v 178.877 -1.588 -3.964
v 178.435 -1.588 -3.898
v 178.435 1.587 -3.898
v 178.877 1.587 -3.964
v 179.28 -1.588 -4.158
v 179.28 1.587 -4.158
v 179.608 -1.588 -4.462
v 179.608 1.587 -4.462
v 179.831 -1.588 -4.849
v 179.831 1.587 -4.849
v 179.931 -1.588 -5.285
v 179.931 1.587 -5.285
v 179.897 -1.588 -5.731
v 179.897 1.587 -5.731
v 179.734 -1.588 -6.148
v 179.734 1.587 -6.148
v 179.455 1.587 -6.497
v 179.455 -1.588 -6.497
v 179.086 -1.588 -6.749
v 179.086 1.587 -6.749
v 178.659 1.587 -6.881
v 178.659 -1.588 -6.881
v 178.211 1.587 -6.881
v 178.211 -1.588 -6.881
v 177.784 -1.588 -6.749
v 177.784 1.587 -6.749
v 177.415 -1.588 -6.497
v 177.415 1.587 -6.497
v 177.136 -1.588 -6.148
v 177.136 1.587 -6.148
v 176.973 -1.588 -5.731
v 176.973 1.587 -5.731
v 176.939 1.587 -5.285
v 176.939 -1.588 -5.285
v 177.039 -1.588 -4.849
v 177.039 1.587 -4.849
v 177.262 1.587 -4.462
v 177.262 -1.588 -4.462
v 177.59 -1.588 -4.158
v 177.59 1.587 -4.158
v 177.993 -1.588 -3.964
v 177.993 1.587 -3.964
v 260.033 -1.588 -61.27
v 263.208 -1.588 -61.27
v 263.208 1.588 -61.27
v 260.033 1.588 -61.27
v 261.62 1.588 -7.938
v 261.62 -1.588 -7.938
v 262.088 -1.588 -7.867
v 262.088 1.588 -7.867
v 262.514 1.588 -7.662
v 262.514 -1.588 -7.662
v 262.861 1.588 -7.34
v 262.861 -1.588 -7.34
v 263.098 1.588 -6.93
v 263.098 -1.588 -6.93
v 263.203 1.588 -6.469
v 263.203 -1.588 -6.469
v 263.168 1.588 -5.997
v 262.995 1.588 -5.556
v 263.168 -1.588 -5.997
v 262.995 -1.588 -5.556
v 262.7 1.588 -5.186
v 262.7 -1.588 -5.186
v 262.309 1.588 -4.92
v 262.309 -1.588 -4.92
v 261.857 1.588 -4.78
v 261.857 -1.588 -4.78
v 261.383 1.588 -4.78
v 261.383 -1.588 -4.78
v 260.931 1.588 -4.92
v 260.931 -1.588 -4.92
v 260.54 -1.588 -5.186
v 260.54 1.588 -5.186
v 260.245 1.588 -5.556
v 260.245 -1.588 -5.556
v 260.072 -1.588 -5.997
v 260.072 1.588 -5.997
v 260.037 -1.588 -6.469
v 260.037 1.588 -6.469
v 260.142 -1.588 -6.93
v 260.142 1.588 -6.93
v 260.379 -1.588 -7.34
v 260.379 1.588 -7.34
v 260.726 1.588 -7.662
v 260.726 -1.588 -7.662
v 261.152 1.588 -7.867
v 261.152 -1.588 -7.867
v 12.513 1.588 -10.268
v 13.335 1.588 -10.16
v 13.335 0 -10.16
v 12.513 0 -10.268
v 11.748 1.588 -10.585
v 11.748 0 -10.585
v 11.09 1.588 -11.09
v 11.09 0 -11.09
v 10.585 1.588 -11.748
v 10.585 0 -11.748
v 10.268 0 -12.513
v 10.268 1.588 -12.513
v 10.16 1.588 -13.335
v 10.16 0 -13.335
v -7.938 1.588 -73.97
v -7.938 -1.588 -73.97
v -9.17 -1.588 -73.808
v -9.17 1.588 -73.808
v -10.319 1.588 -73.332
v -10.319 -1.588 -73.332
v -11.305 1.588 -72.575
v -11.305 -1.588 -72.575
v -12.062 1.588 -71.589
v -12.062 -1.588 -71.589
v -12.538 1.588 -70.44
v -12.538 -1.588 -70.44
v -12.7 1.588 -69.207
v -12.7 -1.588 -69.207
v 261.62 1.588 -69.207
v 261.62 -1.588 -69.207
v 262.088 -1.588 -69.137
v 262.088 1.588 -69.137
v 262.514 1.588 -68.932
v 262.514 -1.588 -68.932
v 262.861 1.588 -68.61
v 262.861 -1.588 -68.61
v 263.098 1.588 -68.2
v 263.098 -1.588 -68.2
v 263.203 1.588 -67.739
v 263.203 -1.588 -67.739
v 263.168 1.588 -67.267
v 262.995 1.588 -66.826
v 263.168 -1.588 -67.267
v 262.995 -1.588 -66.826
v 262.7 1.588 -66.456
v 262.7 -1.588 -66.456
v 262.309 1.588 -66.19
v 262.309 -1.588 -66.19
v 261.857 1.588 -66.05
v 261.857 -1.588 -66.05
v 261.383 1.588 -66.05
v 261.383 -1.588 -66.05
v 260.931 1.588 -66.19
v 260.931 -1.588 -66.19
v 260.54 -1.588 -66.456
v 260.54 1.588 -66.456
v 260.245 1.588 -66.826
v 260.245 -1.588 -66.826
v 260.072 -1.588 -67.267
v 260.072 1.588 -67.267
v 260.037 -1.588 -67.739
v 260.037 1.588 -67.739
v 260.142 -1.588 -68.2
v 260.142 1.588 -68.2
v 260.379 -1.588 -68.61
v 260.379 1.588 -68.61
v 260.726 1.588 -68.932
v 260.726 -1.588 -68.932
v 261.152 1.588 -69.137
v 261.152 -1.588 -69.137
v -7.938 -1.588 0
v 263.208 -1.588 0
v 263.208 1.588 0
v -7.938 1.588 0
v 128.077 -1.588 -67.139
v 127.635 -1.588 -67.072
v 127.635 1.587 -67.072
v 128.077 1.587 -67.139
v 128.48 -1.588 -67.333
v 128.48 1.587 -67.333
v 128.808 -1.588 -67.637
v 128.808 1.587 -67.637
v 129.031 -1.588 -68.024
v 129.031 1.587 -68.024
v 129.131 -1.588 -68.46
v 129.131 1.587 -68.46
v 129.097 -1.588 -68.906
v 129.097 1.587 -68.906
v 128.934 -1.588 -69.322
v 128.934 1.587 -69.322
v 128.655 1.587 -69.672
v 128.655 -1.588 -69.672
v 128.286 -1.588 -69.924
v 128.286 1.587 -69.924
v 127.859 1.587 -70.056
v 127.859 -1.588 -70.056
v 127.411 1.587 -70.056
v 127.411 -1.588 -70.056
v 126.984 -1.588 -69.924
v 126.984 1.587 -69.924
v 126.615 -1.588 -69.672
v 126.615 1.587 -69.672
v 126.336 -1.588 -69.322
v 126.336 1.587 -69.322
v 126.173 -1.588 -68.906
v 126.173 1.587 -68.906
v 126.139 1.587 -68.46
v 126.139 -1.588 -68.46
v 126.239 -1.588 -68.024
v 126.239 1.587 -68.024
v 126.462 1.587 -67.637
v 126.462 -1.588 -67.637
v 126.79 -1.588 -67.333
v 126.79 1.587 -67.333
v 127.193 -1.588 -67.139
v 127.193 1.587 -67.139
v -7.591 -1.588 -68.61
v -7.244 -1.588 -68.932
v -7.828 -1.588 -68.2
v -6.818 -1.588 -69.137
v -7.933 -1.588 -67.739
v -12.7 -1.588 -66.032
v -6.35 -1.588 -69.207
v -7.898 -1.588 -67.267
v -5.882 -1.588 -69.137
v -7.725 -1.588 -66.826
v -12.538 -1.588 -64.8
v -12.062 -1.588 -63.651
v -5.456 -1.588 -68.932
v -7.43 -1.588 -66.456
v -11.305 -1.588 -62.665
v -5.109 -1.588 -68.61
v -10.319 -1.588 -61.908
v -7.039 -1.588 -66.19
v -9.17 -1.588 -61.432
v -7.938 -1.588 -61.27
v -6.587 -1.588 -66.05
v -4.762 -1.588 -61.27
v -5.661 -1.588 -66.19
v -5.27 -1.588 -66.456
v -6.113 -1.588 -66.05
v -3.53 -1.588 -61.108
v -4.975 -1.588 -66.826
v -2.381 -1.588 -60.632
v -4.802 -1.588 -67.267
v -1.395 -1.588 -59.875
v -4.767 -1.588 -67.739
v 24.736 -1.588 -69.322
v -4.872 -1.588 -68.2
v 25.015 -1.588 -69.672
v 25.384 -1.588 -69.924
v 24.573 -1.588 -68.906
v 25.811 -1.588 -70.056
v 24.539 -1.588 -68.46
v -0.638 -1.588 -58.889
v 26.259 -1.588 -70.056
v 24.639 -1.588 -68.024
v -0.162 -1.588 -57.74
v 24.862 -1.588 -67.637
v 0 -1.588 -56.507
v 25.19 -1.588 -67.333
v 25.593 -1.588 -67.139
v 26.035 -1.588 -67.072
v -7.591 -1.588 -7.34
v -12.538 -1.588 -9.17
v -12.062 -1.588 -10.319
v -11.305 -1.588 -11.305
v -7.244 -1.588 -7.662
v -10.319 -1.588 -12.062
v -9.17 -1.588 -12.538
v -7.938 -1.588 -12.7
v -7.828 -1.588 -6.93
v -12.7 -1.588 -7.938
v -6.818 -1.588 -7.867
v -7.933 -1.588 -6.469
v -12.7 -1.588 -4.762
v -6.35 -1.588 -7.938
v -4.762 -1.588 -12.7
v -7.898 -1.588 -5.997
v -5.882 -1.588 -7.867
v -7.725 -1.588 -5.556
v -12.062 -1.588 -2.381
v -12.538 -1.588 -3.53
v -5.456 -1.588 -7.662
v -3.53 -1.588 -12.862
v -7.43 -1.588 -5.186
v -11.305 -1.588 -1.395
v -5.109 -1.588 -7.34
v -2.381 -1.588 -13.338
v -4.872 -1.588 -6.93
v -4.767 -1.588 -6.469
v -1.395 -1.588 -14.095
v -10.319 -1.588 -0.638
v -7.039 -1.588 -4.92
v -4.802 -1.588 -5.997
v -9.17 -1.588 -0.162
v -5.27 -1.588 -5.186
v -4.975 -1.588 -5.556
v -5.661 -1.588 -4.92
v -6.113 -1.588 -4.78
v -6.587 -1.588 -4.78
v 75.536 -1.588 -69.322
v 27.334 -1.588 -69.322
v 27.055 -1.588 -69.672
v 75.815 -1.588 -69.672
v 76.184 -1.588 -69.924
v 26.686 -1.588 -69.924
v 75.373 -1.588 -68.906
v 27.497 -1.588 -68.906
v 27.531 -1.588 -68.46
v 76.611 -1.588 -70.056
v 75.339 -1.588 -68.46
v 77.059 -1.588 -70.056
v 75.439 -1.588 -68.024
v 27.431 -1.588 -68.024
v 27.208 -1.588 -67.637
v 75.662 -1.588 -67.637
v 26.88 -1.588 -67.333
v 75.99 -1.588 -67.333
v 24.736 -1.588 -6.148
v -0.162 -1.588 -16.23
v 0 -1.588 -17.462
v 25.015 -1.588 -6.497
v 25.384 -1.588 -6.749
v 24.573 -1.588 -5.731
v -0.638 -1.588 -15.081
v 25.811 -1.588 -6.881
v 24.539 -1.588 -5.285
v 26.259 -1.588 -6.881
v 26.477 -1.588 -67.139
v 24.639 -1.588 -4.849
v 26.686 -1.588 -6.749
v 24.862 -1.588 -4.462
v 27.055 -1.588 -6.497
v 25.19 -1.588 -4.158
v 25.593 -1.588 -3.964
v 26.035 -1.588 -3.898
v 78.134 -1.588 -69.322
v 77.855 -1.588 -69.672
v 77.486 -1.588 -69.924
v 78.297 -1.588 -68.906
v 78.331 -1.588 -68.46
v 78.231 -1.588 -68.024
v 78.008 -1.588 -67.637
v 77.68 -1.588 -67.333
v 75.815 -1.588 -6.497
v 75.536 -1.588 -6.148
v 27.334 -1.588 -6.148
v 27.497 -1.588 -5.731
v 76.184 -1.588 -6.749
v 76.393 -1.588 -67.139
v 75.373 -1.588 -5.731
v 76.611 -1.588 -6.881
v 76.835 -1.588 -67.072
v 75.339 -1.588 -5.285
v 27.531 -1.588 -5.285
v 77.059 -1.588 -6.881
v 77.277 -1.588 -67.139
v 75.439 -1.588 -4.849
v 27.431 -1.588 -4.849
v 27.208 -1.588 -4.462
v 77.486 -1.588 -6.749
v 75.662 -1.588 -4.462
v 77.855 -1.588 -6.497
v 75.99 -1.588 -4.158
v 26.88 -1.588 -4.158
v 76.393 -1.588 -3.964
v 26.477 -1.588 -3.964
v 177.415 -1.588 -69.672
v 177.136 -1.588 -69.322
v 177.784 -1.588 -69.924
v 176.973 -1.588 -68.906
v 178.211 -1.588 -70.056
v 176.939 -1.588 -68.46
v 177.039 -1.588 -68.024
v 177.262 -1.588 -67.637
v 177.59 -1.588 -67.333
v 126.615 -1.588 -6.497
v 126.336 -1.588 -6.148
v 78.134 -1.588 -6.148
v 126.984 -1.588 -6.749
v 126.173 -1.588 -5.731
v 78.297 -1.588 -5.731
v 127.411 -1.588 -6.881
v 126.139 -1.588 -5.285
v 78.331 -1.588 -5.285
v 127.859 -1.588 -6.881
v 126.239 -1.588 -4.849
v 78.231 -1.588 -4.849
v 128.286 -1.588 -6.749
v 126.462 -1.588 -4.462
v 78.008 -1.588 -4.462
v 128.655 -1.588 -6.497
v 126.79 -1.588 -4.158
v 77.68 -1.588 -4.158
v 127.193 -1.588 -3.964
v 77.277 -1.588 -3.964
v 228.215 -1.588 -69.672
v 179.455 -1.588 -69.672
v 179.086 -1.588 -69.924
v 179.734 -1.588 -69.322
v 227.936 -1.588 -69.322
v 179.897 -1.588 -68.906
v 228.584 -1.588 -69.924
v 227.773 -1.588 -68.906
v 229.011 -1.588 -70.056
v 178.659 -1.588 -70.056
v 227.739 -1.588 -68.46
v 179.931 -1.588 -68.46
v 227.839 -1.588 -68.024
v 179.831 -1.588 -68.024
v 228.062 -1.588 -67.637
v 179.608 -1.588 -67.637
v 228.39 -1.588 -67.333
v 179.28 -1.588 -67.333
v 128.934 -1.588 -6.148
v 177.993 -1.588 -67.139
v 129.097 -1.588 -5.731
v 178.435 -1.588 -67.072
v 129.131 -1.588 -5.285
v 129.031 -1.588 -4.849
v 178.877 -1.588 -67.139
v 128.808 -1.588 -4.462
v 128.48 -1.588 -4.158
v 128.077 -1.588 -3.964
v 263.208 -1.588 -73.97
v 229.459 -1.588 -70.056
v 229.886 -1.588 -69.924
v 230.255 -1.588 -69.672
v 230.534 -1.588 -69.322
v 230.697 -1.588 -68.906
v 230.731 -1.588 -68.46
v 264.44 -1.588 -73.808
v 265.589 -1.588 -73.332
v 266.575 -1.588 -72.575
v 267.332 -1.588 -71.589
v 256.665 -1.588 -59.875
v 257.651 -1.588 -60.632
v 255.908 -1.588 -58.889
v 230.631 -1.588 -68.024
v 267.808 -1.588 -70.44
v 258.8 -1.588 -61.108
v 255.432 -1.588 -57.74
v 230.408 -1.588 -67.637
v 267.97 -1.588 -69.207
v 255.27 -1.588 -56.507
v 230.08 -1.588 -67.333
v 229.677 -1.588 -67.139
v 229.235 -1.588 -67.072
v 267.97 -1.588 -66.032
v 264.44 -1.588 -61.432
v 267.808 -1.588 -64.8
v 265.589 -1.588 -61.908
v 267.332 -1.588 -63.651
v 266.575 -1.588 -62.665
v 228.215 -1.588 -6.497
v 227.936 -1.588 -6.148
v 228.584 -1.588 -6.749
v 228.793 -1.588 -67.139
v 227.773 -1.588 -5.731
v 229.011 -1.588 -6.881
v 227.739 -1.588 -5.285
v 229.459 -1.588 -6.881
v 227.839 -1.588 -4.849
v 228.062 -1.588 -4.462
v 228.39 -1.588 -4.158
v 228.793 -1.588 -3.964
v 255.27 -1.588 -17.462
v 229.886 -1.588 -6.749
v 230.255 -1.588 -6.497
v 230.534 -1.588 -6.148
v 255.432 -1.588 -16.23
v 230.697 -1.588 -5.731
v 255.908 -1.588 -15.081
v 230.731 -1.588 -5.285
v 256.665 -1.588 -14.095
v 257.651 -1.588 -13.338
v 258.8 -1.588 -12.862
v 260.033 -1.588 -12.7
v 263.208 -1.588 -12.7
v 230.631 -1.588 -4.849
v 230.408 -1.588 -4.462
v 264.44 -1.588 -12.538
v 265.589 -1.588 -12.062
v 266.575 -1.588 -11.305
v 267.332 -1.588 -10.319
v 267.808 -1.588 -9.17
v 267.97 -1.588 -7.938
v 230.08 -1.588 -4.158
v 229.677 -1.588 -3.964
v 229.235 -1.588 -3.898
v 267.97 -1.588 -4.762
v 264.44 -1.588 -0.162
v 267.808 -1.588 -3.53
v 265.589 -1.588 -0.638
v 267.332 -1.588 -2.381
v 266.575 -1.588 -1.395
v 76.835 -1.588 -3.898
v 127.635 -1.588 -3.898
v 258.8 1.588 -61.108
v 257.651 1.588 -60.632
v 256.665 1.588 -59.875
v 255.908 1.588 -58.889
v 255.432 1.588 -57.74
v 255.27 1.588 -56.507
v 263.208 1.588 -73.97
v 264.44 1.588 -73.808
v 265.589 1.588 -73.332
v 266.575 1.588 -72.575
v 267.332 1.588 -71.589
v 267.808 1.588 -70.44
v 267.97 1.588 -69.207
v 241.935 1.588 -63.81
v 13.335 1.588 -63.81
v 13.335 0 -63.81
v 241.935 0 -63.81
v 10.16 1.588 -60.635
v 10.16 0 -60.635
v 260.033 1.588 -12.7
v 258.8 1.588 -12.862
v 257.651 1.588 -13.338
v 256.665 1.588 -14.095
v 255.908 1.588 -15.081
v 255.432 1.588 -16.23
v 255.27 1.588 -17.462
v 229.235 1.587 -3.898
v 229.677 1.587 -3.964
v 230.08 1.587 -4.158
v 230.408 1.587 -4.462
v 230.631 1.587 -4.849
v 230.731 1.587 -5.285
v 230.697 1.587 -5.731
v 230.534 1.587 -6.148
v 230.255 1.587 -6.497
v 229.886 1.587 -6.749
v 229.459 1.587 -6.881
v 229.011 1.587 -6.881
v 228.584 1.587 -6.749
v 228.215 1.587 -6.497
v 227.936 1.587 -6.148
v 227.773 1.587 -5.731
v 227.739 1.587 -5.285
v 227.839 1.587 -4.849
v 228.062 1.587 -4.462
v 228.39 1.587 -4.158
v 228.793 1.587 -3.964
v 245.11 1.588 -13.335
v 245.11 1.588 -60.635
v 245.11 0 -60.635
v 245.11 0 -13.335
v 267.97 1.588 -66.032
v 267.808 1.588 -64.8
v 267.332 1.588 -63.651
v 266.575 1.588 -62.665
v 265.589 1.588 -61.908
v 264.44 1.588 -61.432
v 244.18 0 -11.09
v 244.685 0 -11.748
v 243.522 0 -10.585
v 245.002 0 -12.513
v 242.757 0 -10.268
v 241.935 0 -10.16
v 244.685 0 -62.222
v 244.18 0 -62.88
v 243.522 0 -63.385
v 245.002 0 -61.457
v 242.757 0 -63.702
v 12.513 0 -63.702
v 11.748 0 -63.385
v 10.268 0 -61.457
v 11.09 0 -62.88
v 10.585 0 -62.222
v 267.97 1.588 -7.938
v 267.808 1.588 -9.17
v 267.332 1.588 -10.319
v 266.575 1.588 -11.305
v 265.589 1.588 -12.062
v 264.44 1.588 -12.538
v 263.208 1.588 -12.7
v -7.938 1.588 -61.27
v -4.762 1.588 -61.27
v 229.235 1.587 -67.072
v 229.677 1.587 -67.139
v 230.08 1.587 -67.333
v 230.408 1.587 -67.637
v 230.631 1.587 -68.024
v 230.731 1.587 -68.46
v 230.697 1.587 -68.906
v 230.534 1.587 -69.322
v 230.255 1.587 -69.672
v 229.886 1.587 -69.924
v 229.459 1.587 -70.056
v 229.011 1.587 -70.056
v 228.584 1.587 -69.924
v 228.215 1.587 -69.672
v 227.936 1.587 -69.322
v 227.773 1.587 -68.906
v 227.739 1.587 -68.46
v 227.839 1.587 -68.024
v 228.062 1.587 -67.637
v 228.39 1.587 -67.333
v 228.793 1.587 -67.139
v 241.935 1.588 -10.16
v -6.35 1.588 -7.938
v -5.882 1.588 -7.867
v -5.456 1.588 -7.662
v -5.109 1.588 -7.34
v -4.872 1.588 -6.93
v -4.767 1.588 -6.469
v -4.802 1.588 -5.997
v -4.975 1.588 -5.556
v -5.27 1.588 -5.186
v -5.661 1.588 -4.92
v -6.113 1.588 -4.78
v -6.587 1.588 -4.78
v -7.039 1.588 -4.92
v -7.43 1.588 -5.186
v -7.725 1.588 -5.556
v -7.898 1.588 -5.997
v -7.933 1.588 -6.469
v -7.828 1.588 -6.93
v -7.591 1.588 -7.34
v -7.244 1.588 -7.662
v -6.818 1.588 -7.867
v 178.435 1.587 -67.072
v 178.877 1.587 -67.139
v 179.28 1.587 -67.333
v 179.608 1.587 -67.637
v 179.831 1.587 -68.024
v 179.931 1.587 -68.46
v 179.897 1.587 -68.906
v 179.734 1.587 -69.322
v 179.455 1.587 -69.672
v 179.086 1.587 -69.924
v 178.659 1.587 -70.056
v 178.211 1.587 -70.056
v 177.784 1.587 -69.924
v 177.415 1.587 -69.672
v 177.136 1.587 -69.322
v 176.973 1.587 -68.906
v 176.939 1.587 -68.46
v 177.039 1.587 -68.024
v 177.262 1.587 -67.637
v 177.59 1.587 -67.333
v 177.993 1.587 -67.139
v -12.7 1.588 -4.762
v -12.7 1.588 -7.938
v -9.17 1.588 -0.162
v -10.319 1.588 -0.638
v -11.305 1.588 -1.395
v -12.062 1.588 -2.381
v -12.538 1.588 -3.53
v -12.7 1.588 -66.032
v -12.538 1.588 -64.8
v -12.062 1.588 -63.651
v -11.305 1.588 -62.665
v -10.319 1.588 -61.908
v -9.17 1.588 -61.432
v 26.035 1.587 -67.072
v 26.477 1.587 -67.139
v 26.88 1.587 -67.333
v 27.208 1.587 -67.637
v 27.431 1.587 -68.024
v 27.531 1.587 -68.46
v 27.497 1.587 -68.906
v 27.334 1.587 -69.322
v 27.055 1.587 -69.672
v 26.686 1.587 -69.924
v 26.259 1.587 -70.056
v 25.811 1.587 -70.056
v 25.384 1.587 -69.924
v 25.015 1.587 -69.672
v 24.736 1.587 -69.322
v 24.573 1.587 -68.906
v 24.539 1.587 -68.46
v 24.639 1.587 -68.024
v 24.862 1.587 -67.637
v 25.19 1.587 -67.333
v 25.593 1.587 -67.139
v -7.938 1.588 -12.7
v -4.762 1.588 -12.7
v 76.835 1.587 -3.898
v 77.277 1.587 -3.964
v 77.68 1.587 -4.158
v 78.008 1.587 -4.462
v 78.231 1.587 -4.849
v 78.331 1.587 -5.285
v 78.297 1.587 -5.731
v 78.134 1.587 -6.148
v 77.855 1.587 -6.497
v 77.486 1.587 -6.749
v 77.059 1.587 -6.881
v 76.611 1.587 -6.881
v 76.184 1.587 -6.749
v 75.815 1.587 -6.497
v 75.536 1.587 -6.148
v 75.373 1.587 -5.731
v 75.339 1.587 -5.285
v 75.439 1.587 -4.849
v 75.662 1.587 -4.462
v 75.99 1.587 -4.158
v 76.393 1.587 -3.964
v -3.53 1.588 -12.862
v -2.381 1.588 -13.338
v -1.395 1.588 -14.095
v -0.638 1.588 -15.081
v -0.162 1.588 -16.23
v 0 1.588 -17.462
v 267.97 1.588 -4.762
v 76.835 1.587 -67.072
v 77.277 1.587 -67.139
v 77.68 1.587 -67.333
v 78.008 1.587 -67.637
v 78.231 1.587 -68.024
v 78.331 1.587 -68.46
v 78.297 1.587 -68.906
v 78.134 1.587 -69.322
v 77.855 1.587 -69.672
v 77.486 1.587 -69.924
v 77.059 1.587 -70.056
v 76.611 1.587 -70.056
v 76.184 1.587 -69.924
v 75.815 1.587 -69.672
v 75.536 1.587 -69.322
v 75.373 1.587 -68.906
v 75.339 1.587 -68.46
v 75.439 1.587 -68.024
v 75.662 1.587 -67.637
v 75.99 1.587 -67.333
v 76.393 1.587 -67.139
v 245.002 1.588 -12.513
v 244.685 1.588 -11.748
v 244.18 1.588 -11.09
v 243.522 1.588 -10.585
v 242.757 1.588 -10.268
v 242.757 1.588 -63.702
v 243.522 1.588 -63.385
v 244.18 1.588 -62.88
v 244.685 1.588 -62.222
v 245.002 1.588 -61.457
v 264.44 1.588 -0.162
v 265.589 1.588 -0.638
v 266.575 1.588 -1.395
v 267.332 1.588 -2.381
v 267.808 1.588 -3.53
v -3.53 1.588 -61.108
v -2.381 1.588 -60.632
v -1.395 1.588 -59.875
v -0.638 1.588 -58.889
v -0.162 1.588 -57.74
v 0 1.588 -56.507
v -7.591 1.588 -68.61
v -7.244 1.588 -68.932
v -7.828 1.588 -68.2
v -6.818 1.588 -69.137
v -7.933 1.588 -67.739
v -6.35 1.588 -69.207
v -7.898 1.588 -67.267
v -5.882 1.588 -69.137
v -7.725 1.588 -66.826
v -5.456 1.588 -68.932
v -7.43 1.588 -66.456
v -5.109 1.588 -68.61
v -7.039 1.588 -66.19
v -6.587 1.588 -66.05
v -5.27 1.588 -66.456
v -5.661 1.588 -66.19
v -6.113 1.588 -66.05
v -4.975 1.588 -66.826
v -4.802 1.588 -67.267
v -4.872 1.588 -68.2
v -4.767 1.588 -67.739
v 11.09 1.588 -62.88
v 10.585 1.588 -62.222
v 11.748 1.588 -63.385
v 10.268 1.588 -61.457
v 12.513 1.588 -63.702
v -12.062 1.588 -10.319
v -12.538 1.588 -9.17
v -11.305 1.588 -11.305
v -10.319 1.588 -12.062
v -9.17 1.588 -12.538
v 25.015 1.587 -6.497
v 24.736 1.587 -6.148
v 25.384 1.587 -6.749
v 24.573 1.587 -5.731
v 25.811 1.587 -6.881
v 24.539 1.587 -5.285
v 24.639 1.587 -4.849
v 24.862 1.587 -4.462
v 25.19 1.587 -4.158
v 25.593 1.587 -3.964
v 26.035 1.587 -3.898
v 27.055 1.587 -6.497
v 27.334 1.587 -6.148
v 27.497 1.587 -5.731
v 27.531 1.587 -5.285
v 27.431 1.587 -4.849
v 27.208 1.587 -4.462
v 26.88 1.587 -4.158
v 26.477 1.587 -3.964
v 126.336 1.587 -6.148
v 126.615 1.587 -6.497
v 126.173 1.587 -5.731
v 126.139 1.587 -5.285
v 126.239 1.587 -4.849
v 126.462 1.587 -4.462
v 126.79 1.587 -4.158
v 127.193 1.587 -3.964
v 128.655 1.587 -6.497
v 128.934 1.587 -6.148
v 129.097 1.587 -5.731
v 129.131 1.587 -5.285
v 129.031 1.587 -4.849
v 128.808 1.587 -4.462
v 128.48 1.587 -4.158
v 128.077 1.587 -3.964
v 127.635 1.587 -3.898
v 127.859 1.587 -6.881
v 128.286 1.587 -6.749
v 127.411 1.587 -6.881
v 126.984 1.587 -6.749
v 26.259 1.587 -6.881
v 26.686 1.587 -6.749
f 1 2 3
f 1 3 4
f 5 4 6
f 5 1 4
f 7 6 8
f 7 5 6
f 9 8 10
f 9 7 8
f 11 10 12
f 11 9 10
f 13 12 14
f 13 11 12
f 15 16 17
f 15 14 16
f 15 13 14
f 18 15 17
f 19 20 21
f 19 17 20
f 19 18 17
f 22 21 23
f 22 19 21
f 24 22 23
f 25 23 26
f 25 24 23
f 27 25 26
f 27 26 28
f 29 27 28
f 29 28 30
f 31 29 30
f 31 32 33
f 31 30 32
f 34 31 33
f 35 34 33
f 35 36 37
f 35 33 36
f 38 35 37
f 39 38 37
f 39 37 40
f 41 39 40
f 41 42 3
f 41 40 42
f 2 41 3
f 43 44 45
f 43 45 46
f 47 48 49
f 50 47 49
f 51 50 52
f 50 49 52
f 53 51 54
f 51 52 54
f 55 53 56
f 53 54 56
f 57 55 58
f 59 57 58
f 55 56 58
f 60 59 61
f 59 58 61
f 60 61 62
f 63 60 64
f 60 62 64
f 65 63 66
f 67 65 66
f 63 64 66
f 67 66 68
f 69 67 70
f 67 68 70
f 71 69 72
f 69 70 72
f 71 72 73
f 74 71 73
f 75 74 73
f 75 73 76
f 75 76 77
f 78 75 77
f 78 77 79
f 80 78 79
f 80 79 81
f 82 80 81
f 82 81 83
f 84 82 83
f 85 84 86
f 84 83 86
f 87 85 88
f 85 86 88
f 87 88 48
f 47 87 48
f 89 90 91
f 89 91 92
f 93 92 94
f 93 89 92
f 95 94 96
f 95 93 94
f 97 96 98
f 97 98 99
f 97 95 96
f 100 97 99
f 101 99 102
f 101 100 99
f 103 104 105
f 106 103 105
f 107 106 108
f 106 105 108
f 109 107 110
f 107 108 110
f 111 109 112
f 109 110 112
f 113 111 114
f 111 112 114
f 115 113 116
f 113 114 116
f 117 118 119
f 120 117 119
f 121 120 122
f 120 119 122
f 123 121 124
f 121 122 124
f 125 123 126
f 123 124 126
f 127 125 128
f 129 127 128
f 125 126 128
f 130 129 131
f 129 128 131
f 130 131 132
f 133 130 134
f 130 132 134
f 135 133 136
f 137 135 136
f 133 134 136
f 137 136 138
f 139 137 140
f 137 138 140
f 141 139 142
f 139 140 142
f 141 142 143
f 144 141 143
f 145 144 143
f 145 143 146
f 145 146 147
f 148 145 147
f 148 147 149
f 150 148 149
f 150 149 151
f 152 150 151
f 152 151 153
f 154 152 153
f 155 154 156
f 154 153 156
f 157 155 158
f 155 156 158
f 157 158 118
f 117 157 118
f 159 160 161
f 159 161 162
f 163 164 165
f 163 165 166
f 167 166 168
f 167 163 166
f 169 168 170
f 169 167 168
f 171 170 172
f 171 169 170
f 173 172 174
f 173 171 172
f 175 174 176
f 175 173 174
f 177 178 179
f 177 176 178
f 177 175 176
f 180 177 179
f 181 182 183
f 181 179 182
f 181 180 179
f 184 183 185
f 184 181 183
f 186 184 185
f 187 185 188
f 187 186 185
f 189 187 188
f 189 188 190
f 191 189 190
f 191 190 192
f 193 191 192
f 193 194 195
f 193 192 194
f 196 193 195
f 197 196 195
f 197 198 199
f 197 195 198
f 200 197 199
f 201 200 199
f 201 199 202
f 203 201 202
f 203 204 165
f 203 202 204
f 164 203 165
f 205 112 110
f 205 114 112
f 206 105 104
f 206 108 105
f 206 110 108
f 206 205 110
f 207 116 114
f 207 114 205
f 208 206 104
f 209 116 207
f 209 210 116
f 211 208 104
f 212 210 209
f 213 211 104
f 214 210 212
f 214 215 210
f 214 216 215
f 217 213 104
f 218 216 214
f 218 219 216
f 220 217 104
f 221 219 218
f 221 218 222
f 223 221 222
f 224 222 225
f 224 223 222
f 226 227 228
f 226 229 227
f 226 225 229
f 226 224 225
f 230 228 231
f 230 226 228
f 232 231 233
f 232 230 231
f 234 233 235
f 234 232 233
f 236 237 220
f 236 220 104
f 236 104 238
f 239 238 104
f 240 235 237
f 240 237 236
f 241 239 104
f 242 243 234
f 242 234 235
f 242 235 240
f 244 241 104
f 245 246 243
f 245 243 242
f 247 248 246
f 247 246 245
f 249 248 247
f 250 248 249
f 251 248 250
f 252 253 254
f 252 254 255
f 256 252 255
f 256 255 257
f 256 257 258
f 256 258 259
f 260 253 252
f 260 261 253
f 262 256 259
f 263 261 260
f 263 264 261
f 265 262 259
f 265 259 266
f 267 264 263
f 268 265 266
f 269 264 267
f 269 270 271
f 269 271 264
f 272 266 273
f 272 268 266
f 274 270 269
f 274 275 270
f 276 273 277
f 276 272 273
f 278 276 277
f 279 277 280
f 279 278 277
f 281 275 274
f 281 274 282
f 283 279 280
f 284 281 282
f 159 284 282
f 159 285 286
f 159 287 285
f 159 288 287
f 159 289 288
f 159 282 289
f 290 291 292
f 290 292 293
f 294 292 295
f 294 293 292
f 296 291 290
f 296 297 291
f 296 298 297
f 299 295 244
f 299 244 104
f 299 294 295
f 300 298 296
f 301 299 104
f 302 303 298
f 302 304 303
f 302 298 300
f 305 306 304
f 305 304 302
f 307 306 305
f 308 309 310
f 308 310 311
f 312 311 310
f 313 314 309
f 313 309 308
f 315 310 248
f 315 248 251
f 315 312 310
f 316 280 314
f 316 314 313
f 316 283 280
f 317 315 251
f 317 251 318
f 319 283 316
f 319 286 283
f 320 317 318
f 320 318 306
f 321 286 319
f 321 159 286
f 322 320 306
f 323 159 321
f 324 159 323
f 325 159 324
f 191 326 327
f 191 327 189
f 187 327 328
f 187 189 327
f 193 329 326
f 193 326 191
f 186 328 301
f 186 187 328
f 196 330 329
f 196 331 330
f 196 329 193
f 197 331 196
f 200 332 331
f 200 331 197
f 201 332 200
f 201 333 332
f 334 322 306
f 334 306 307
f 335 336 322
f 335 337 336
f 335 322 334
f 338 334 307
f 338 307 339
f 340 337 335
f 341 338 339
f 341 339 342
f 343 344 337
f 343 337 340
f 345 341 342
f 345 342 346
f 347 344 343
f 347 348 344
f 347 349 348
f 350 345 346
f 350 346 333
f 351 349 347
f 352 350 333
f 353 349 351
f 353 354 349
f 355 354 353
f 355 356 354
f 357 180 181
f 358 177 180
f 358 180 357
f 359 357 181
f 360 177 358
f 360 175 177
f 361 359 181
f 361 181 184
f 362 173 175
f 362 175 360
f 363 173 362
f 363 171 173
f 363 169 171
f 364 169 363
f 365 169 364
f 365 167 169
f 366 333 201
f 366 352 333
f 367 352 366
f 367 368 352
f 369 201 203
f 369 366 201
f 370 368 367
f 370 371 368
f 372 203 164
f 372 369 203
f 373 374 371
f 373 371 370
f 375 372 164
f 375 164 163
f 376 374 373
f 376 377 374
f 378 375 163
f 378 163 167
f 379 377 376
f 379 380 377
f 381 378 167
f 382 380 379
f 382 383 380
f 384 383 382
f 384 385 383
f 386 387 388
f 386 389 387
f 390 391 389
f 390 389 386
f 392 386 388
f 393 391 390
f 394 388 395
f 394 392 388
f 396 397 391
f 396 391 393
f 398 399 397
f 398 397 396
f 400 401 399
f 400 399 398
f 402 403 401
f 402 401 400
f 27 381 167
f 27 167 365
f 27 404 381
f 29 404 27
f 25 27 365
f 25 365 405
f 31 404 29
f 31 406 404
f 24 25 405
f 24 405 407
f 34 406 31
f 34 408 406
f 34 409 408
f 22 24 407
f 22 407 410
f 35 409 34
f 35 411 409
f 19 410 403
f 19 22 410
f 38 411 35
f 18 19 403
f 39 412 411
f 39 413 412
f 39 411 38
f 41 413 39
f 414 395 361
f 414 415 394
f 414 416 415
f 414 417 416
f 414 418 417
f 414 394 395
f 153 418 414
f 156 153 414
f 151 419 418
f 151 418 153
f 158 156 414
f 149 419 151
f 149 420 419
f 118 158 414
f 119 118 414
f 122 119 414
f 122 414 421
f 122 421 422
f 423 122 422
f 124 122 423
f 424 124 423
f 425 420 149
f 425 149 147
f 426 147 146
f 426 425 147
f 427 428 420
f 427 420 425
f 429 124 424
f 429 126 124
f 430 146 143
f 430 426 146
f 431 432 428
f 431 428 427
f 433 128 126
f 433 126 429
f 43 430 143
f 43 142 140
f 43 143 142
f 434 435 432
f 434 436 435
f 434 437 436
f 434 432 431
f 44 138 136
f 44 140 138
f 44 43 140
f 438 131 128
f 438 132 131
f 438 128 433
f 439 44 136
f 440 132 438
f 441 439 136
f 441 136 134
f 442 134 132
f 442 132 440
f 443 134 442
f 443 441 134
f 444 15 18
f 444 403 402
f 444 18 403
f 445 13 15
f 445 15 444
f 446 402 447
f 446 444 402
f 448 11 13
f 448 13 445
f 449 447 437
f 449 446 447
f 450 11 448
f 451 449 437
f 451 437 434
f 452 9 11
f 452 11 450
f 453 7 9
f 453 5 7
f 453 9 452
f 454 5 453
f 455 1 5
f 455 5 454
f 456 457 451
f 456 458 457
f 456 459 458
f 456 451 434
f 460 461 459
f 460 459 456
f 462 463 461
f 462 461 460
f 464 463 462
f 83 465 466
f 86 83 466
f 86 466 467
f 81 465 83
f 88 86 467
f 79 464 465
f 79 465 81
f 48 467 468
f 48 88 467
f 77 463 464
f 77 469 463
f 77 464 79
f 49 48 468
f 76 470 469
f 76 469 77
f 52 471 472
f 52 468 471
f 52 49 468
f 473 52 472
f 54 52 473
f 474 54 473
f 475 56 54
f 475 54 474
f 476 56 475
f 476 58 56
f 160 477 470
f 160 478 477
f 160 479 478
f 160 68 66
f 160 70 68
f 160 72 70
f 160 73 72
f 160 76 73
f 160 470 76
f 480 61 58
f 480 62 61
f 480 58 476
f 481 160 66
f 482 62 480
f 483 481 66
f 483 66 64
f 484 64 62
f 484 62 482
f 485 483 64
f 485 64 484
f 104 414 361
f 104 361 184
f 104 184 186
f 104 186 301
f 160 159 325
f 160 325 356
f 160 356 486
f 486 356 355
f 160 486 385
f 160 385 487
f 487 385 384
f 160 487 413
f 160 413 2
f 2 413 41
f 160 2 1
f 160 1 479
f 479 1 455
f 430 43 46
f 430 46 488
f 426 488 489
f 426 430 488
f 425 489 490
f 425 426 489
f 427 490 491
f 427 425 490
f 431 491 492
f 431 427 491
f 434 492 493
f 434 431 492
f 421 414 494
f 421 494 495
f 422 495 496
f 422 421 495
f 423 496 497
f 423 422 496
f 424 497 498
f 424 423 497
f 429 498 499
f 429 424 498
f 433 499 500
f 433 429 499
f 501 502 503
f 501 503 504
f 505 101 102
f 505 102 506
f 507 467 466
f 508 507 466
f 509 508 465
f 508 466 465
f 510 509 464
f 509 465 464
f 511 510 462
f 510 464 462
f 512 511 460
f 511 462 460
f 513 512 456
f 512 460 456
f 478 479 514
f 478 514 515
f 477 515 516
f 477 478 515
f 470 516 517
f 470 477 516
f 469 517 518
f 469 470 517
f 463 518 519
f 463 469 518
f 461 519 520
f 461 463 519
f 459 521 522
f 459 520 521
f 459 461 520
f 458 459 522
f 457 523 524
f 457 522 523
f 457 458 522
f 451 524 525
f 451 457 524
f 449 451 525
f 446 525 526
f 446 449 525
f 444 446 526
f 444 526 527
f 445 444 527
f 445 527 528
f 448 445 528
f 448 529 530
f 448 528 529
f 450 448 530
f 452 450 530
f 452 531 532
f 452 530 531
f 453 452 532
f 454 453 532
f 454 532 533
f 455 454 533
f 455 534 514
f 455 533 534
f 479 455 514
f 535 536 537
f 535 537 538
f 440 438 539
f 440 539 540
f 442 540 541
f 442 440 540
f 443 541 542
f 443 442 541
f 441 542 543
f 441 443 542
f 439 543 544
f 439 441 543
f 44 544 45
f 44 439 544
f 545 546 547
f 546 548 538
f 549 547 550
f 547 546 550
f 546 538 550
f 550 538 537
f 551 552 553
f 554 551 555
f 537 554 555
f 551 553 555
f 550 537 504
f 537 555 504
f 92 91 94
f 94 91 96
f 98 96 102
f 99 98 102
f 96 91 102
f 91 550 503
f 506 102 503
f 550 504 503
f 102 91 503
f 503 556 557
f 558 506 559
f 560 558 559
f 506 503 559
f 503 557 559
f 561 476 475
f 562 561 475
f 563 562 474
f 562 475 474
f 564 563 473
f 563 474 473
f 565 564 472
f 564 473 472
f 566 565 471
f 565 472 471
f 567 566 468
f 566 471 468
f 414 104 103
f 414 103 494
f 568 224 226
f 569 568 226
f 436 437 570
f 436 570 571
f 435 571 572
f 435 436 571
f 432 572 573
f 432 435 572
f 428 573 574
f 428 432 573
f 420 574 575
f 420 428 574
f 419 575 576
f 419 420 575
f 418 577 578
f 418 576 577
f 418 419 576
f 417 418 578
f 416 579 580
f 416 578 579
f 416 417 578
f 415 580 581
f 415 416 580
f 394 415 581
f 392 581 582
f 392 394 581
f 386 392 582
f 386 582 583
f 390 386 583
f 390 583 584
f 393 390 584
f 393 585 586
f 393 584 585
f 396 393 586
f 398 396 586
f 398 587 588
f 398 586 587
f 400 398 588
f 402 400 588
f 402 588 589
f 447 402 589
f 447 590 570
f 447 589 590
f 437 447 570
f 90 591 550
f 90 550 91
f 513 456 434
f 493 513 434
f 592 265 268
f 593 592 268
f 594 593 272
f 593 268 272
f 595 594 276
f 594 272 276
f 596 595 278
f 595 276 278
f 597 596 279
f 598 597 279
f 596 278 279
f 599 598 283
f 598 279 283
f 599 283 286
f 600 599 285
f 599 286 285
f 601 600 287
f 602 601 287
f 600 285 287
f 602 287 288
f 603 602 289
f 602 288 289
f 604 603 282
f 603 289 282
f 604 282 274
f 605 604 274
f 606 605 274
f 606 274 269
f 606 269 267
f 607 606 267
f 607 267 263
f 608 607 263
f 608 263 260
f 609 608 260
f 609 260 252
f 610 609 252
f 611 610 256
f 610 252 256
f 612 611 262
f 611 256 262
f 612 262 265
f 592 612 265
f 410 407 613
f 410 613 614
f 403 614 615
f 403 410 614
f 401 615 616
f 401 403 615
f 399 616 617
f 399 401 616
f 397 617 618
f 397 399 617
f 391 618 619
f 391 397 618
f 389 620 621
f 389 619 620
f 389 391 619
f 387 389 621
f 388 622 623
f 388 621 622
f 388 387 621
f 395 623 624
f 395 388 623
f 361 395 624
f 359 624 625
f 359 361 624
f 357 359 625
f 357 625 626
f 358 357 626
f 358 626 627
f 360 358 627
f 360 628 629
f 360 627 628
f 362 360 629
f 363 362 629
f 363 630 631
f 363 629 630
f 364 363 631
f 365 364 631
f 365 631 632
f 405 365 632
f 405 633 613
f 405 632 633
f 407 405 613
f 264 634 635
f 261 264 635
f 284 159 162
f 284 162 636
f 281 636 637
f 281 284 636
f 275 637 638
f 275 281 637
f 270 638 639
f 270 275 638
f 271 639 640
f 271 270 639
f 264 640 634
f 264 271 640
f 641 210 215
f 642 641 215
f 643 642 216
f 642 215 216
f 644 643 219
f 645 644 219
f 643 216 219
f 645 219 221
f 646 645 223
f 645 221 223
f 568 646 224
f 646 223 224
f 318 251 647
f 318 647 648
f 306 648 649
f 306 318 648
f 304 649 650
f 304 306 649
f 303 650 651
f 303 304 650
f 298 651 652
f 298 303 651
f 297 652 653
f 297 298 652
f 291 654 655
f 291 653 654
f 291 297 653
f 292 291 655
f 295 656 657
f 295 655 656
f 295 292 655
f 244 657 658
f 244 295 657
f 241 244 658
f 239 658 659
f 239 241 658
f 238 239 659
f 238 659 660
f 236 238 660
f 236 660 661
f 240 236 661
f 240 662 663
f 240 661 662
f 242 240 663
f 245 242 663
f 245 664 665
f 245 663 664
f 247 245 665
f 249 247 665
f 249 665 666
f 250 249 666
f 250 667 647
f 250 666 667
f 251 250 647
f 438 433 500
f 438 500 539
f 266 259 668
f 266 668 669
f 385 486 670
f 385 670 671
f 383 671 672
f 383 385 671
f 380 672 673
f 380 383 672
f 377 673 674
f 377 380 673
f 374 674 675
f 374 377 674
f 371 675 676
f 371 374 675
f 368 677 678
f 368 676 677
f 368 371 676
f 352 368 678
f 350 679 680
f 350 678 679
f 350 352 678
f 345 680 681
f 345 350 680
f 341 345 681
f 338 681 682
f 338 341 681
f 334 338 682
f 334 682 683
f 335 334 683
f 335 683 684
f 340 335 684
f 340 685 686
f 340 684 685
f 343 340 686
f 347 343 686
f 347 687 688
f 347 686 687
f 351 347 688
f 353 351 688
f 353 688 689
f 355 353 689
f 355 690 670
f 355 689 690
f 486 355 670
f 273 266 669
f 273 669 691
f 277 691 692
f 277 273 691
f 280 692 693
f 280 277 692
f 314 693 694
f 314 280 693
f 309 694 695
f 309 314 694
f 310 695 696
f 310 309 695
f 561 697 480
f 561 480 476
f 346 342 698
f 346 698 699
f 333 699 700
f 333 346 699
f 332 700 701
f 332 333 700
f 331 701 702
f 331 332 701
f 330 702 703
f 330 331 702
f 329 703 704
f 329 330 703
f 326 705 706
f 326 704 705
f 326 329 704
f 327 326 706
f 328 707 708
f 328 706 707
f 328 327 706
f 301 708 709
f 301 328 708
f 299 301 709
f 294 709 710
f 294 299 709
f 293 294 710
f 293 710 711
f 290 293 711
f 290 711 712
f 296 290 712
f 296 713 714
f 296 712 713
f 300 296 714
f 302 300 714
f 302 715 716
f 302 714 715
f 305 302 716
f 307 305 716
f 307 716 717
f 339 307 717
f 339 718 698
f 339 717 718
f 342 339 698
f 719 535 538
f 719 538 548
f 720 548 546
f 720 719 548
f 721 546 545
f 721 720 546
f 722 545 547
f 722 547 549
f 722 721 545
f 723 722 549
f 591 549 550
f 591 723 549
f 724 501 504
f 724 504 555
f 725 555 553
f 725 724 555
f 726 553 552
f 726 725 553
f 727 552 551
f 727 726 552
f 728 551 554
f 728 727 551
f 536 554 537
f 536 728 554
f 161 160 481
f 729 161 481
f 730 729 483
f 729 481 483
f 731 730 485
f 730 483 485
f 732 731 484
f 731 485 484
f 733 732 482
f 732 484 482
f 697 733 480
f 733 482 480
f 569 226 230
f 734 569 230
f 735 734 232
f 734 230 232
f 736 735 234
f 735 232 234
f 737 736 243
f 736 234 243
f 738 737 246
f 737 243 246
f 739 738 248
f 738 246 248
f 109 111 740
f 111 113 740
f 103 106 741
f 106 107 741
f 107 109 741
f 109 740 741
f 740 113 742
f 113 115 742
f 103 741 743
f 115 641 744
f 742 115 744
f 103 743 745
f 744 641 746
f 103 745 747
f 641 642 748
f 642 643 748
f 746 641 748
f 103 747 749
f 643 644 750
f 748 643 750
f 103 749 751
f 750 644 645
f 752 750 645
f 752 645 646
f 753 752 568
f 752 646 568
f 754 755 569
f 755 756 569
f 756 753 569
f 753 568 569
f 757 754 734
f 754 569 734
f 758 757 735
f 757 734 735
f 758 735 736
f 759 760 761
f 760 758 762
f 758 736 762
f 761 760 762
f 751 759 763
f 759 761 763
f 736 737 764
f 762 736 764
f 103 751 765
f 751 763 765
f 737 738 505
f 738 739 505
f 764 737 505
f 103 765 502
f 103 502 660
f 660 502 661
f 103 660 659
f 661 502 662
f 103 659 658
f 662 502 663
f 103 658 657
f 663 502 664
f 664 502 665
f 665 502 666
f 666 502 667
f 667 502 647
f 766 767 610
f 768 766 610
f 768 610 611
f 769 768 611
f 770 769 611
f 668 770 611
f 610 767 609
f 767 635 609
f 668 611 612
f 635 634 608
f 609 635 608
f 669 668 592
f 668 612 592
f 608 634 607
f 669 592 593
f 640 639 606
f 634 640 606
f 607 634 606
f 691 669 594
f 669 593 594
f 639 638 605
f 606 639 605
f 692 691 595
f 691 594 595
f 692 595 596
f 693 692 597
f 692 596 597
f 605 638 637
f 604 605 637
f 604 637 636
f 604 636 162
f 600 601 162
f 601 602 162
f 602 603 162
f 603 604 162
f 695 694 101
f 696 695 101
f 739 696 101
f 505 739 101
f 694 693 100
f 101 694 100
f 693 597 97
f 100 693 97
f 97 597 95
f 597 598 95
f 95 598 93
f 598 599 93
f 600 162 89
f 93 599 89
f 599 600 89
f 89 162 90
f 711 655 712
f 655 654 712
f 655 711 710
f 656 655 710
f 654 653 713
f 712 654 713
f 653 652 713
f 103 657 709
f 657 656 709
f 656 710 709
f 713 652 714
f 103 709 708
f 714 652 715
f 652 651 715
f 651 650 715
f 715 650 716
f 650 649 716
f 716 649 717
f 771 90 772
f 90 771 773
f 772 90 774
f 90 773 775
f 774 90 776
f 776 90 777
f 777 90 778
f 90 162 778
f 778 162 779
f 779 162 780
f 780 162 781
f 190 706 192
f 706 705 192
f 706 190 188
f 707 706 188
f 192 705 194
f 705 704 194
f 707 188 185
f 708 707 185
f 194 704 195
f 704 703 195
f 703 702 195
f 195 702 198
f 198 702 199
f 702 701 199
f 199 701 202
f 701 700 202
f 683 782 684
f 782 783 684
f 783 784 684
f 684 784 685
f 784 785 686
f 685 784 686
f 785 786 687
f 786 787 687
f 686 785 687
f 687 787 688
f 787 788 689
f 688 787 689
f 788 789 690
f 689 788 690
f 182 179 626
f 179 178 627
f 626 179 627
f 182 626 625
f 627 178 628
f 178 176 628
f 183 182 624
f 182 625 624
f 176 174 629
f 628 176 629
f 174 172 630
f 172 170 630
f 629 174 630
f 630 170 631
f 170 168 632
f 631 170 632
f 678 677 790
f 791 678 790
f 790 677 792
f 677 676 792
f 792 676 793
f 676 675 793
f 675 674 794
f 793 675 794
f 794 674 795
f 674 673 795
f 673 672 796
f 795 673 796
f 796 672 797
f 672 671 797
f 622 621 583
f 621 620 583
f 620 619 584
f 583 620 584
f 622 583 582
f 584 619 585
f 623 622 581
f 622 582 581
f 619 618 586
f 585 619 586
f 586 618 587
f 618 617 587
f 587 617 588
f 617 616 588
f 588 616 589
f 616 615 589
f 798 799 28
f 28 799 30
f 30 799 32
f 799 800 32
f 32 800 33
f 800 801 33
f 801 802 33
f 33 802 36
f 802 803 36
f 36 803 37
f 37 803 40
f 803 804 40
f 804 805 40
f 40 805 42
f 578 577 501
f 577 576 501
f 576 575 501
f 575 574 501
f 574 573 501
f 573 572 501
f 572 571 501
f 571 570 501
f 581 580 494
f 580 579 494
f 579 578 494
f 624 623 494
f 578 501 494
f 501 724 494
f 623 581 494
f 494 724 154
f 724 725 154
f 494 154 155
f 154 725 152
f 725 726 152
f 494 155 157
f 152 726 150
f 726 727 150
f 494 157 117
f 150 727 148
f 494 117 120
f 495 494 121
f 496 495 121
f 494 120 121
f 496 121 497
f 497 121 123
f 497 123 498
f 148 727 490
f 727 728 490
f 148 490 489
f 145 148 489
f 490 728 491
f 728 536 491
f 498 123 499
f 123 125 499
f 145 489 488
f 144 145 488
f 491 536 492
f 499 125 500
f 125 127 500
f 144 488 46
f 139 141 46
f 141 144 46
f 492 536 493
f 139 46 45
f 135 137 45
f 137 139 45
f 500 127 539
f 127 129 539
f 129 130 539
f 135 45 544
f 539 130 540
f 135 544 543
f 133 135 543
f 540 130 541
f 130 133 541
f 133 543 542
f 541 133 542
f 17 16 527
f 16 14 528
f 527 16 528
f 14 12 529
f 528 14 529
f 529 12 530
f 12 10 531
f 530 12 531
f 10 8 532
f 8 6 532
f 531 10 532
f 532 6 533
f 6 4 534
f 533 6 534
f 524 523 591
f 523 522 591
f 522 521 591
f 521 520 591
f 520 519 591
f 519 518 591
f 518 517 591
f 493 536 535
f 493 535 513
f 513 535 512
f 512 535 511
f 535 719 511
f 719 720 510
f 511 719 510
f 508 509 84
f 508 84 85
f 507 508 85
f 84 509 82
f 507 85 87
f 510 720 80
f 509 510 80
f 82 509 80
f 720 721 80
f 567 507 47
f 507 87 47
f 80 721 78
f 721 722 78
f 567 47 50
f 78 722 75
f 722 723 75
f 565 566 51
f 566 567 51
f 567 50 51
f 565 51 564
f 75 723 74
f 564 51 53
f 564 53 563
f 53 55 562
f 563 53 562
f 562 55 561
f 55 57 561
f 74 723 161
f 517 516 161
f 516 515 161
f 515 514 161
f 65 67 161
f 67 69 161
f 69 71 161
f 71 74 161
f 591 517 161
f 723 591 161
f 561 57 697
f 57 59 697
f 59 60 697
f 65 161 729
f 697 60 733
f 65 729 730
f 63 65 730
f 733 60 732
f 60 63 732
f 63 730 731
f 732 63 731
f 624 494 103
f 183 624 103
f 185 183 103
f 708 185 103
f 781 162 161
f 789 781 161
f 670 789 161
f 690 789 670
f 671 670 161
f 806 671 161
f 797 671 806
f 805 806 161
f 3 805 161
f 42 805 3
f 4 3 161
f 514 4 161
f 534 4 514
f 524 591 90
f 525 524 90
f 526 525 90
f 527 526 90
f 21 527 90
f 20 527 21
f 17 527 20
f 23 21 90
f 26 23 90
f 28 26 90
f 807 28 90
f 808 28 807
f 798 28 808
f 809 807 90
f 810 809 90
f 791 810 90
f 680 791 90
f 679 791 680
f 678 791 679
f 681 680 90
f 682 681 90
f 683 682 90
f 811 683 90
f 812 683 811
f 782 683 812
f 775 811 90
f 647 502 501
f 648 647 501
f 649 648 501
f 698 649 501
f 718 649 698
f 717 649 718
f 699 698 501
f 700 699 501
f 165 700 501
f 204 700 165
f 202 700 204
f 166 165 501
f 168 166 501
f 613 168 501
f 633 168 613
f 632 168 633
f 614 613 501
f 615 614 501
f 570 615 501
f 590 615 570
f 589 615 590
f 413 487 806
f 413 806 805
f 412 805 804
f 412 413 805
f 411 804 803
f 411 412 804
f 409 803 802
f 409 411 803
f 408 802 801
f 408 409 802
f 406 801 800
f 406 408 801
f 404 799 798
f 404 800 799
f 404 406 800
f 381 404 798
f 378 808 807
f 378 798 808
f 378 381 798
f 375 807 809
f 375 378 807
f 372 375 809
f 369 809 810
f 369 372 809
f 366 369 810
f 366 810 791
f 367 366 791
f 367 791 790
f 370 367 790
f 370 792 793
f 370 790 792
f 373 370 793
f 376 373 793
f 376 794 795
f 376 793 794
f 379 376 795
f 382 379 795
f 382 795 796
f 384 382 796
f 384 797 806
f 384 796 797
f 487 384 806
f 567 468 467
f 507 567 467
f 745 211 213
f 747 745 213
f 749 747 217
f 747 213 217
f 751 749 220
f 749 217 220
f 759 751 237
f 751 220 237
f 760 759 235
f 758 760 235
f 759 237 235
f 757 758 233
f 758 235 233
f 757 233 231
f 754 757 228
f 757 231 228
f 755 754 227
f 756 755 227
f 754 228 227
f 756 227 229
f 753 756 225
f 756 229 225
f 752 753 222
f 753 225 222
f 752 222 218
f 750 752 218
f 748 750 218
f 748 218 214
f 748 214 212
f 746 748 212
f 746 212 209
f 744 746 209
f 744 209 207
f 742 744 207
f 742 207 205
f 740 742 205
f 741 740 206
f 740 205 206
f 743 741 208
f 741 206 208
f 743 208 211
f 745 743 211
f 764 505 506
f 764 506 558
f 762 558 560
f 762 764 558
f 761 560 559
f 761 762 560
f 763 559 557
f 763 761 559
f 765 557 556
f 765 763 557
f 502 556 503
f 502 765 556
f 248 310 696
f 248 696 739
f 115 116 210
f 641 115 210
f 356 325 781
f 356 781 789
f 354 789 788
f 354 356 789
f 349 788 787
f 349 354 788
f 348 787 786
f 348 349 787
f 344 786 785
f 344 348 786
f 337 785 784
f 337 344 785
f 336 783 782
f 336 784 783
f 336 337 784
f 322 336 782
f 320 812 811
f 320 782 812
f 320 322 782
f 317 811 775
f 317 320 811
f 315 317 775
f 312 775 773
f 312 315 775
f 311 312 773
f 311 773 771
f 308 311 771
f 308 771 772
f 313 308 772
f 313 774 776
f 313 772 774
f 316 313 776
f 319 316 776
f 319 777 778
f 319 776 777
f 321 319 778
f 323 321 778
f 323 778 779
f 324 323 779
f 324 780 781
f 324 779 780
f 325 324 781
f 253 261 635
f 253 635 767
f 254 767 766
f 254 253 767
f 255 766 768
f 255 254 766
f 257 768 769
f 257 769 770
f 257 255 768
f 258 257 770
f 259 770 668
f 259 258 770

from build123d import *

# Parameters (mm, degrees)
BOSS_EXTRUDE1_DEPTH      = 1.5875
BOSS_EXTRUDE1_DEPTH_BACK = 1.5875
SKETCH1_W                = 255.27
SKETCH1_H                = 73.96988
SKETCH1_R                = 1.5
BOSS_EXTRUDE2_DEPTH      = 1.5875
BOSS_EXTRUDE2_DEPTH_BACK = 1.5875
SKETCH1_4_W              = 255.27
SKETCH1_4_H              = 73.96988
CUT_EXTRUDE1_DEPTH       = 1.5875
CUT_EXTRUDE2_DEPTH       = 3.175
CUT_EXTRUDE2_DEPTH_BACK  = 3.175
SKETCH1_6_R              = 1.5
SKETCH3_R                = 1.5875
BOSS_EXTRUDE3_DEPTH      = 3.175


with BuildPart() as part:
    # Sketch1 → Boss-Extrude1 (new, two sides: drawn at the far end of the back side and taken through both)
    with BuildSketch(Plane(origin=(0, 0, 0), x_dir=(1, 0, 0), z_dir=(0, 1, 0)).offset(-BOSS_EXTRUDE1_DEPTH_BACK)):
        with Locations((127.635, 36.98494)):
            Rectangle(SKETCH1_W, SKETCH1_H)
        with Locations((26.035, 5.3975)):
            Circle(SKETCH1_R, mode=Mode.SUBTRACT)
        with Locations((76.835, 5.3975)):
            Circle(SKETCH1_R, mode=Mode.SUBTRACT)
        with Locations((127.635, 5.3975)):
            Circle(SKETCH1_R, mode=Mode.SUBTRACT)
        with Locations((178.435, 5.3975)):
            Circle(SKETCH1_R, mode=Mode.SUBTRACT)
        with Locations((229.235, 5.3975)):
            Circle(SKETCH1_R, mode=Mode.SUBTRACT)
        with Locations((26.035, 68.57238)):
            Circle(SKETCH1_R, mode=Mode.SUBTRACT)
        with Locations((76.835, 68.57238)):
            Circle(SKETCH1_R, mode=Mode.SUBTRACT)
        with Locations((127.635, 68.57238)):
            Circle(SKETCH1_R, mode=Mode.SUBTRACT)
        with Locations((178.435, 68.57238)):
            Circle(SKETCH1_R, mode=Mode.SUBTRACT)
        with Locations((229.235, 68.57238)):
            Circle(SKETCH1_R, mode=Mode.SUBTRACT)
    extrude(amount=BOSS_EXTRUDE1_DEPTH + BOSS_EXTRUDE1_DEPTH_BACK)

    # Sketch1<4> → Boss-Extrude2 (add, two sides: drawn at the far end of the back side and taken through both)
    with BuildSketch(Plane(origin=(0, 0, 0), x_dir=(1, 0, 0), z_dir=(0, 1, 0)).offset(-BOSS_EXTRUDE2_DEPTH_BACK)):
        with Locations((127.635, 36.98494)):
            Rectangle(SKETCH1_4_W, SKETCH1_4_H)
    extrude(amount=BOSS_EXTRUDE2_DEPTH + BOSS_EXTRUDE2_DEPTH_BACK)

    # Sketch2 → Cut-Extrude1 (cut)
    with BuildSketch(Plane(origin=(0, 1.5875, 0), x_dir=(1, 0, 0), z_dir=(0, 1, 0))):
        with BuildLine():
            Line((13.335, 63.80988), (241.935, 63.80988))
            ThreePointArc((241.935, 63.80988), (244.18006403, 62.87994403), (245.11, 60.63488))
            Line((245.11, 60.63488), (245.11, 13.335))
            ThreePointArc((245.11, 13.335), (244.18006403, 11.08993597), (241.935, 10.16))
            Line((241.935, 10.16), (13.335, 10.16))
            ThreePointArc((13.335, 10.16), (11.08993597, 11.08993597), (10.16, 13.335))
            Line((10.16, 13.335), (10.16, 60.63488))
            ThreePointArc((10.16, 60.63488), (11.08993597, 62.87994403), (13.335, 63.80988))
        make_face()
    extrude(amount=-CUT_EXTRUDE1_DEPTH, mode=Mode.SUBTRACT)

    # Sketch1<6> → Cut-Extrude2 (cut, two sides: drawn at the far end of the back side and taken through both)
    with BuildSketch(Plane(origin=(0, 0, 0), x_dir=(1, 0, 0), z_dir=(0, 1, 0)).offset(-CUT_EXTRUDE2_DEPTH_BACK)):
        with Locations((178.435, 68.57238)):
            Circle(SKETCH1_6_R)
        with Locations((178.435, 5.3975)):
            Circle(SKETCH1_6_R)
        with Locations((229.235, 68.57238)):
            Circle(SKETCH1_6_R)
        with Locations((229.235, 5.3975)):
            Circle(SKETCH1_6_R)
        with Locations((127.635, 68.57238)):
            Circle(SKETCH1_6_R)
        with Locations((127.635, 5.3975)):
            Circle(SKETCH1_6_R)
        with Locations((26.035, 5.3975)):
            Circle(SKETCH1_6_R)
        with Locations((76.835, 5.3975)):
            Circle(SKETCH1_6_R)
        with Locations((26.035, 68.57238)):
            Circle(SKETCH1_6_R)
        with Locations((76.835, 68.57238)):
            Circle(SKETCH1_6_R)
    extrude(amount=CUT_EXTRUDE2_DEPTH + CUT_EXTRUDE2_DEPTH_BACK, mode=Mode.SUBTRACT)

    # Sketch3 → Boss-Extrude3 (add)
    # profile 1 of 4: a face of its own
    with BuildSketch(Plane.XZ.offset(1.5875)):
        with BuildLine():
            ThreePointArc((-4.7625, -12.7), (-1.394903955, -14.094903955), (0, -17.4625))
            Line((0, -17.4625), (0, 0))
            Line((0, 0), (-7.9375, 0))
            ThreePointArc((-7.9375, 0), (-11.305096045, -1.394903955), (-12.7, -4.7625))
            Line((-12.7, -4.7625), (-12.7, -7.9375))
            ThreePointArc((-12.7, -7.9375), (-11.305096045, -11.305096045), (-7.9375, -12.7))
            Line((-7.9375, -12.7), (-4.7625, -12.7))
        make_face()
        with Locations((-6.35, -6.35)):
            Circle(SKETCH3_R, mode=Mode.SUBTRACT)
    # profile 2 of 4: a face of its own
    with BuildSketch(Plane.XZ.offset(1.5875)):
        with BuildLine():
            Line((-4.7625, -61.26988), (-7.9375, -61.26988))
            ThreePointArc((-7.9375, -61.26988), (-11.305096045, -62.664783955), (-12.7, -66.03238))
            Line((-12.7, -66.03238), (-12.7, -69.20738))
            ThreePointArc((-12.7, -69.20738), (-11.305096045, -72.574976045), (-7.9375, -73.96988))
            Line((-7.9375, -73.96988), (0, -73.96988))
            Line((0, -73.96988), (0, -56.50738))
            ThreePointArc((0, -56.50738), (-1.394903955, -59.874976045), (-4.7625, -61.26988))
        make_face()
        with Locations((-6.35, -67.61988)):
            Circle(SKETCH3_R, mode=Mode.SUBTRACT)
    # profile 3 of 4: a face of its own
    with BuildSketch(Plane.XZ.offset(1.5875)):
        with BuildLine():
            ThreePointArc((260.0325, -61.26988), (256.664903955, -59.874976045), (255.27, -56.50738))
            Line((255.27, -56.50738), (255.27, -73.96988))
            Line((255.27, -73.96988), (263.2075, -73.96988))
            ThreePointArc((263.2075, -73.96988), (266.575096045, -72.574976045), (267.97, -69.20738))
            Line((267.97, -69.20738), (267.97, -66.03238))
            ThreePointArc((267.97, -66.03238), (266.575096045, -62.664783955), (263.2075, -61.26988))
            Line((263.2075, -61.26988), (260.0325, -61.26988))
        make_face()
        with Locations((261.62, -67.61988)):
            Circle(SKETCH3_R, mode=Mode.SUBTRACT)
    # profile 4 of 4: a face of its own
    with BuildSketch(Plane.XZ.offset(1.5875)):
        with BuildLine():
            Line((260.0325, -12.7), (263.2075, -12.7))
            ThreePointArc((263.2075, -12.7), (266.575096045, -11.305096045), (267.97, -7.9375))
            Line((267.97, -7.9375), (267.97, -4.7625))
            ThreePointArc((267.97, -4.7625), (266.575096045, -1.394903955), (263.2075, 0))
            Line((263.2075, 0), (255.27, 0))
            Line((255.27, 0), (255.27, -17.4625))
            ThreePointArc((255.27, -17.4625), (256.664903955, -14.094903955), (260.0325, -12.7))
        make_face()
        with Locations((261.62, -6.35)):
            Circle(SKETCH3_R, mode=Mode.SUBTRACT)
    extrude(amount=-BOSS_EXTRUDE3_DEPTH)


solid = part.part
